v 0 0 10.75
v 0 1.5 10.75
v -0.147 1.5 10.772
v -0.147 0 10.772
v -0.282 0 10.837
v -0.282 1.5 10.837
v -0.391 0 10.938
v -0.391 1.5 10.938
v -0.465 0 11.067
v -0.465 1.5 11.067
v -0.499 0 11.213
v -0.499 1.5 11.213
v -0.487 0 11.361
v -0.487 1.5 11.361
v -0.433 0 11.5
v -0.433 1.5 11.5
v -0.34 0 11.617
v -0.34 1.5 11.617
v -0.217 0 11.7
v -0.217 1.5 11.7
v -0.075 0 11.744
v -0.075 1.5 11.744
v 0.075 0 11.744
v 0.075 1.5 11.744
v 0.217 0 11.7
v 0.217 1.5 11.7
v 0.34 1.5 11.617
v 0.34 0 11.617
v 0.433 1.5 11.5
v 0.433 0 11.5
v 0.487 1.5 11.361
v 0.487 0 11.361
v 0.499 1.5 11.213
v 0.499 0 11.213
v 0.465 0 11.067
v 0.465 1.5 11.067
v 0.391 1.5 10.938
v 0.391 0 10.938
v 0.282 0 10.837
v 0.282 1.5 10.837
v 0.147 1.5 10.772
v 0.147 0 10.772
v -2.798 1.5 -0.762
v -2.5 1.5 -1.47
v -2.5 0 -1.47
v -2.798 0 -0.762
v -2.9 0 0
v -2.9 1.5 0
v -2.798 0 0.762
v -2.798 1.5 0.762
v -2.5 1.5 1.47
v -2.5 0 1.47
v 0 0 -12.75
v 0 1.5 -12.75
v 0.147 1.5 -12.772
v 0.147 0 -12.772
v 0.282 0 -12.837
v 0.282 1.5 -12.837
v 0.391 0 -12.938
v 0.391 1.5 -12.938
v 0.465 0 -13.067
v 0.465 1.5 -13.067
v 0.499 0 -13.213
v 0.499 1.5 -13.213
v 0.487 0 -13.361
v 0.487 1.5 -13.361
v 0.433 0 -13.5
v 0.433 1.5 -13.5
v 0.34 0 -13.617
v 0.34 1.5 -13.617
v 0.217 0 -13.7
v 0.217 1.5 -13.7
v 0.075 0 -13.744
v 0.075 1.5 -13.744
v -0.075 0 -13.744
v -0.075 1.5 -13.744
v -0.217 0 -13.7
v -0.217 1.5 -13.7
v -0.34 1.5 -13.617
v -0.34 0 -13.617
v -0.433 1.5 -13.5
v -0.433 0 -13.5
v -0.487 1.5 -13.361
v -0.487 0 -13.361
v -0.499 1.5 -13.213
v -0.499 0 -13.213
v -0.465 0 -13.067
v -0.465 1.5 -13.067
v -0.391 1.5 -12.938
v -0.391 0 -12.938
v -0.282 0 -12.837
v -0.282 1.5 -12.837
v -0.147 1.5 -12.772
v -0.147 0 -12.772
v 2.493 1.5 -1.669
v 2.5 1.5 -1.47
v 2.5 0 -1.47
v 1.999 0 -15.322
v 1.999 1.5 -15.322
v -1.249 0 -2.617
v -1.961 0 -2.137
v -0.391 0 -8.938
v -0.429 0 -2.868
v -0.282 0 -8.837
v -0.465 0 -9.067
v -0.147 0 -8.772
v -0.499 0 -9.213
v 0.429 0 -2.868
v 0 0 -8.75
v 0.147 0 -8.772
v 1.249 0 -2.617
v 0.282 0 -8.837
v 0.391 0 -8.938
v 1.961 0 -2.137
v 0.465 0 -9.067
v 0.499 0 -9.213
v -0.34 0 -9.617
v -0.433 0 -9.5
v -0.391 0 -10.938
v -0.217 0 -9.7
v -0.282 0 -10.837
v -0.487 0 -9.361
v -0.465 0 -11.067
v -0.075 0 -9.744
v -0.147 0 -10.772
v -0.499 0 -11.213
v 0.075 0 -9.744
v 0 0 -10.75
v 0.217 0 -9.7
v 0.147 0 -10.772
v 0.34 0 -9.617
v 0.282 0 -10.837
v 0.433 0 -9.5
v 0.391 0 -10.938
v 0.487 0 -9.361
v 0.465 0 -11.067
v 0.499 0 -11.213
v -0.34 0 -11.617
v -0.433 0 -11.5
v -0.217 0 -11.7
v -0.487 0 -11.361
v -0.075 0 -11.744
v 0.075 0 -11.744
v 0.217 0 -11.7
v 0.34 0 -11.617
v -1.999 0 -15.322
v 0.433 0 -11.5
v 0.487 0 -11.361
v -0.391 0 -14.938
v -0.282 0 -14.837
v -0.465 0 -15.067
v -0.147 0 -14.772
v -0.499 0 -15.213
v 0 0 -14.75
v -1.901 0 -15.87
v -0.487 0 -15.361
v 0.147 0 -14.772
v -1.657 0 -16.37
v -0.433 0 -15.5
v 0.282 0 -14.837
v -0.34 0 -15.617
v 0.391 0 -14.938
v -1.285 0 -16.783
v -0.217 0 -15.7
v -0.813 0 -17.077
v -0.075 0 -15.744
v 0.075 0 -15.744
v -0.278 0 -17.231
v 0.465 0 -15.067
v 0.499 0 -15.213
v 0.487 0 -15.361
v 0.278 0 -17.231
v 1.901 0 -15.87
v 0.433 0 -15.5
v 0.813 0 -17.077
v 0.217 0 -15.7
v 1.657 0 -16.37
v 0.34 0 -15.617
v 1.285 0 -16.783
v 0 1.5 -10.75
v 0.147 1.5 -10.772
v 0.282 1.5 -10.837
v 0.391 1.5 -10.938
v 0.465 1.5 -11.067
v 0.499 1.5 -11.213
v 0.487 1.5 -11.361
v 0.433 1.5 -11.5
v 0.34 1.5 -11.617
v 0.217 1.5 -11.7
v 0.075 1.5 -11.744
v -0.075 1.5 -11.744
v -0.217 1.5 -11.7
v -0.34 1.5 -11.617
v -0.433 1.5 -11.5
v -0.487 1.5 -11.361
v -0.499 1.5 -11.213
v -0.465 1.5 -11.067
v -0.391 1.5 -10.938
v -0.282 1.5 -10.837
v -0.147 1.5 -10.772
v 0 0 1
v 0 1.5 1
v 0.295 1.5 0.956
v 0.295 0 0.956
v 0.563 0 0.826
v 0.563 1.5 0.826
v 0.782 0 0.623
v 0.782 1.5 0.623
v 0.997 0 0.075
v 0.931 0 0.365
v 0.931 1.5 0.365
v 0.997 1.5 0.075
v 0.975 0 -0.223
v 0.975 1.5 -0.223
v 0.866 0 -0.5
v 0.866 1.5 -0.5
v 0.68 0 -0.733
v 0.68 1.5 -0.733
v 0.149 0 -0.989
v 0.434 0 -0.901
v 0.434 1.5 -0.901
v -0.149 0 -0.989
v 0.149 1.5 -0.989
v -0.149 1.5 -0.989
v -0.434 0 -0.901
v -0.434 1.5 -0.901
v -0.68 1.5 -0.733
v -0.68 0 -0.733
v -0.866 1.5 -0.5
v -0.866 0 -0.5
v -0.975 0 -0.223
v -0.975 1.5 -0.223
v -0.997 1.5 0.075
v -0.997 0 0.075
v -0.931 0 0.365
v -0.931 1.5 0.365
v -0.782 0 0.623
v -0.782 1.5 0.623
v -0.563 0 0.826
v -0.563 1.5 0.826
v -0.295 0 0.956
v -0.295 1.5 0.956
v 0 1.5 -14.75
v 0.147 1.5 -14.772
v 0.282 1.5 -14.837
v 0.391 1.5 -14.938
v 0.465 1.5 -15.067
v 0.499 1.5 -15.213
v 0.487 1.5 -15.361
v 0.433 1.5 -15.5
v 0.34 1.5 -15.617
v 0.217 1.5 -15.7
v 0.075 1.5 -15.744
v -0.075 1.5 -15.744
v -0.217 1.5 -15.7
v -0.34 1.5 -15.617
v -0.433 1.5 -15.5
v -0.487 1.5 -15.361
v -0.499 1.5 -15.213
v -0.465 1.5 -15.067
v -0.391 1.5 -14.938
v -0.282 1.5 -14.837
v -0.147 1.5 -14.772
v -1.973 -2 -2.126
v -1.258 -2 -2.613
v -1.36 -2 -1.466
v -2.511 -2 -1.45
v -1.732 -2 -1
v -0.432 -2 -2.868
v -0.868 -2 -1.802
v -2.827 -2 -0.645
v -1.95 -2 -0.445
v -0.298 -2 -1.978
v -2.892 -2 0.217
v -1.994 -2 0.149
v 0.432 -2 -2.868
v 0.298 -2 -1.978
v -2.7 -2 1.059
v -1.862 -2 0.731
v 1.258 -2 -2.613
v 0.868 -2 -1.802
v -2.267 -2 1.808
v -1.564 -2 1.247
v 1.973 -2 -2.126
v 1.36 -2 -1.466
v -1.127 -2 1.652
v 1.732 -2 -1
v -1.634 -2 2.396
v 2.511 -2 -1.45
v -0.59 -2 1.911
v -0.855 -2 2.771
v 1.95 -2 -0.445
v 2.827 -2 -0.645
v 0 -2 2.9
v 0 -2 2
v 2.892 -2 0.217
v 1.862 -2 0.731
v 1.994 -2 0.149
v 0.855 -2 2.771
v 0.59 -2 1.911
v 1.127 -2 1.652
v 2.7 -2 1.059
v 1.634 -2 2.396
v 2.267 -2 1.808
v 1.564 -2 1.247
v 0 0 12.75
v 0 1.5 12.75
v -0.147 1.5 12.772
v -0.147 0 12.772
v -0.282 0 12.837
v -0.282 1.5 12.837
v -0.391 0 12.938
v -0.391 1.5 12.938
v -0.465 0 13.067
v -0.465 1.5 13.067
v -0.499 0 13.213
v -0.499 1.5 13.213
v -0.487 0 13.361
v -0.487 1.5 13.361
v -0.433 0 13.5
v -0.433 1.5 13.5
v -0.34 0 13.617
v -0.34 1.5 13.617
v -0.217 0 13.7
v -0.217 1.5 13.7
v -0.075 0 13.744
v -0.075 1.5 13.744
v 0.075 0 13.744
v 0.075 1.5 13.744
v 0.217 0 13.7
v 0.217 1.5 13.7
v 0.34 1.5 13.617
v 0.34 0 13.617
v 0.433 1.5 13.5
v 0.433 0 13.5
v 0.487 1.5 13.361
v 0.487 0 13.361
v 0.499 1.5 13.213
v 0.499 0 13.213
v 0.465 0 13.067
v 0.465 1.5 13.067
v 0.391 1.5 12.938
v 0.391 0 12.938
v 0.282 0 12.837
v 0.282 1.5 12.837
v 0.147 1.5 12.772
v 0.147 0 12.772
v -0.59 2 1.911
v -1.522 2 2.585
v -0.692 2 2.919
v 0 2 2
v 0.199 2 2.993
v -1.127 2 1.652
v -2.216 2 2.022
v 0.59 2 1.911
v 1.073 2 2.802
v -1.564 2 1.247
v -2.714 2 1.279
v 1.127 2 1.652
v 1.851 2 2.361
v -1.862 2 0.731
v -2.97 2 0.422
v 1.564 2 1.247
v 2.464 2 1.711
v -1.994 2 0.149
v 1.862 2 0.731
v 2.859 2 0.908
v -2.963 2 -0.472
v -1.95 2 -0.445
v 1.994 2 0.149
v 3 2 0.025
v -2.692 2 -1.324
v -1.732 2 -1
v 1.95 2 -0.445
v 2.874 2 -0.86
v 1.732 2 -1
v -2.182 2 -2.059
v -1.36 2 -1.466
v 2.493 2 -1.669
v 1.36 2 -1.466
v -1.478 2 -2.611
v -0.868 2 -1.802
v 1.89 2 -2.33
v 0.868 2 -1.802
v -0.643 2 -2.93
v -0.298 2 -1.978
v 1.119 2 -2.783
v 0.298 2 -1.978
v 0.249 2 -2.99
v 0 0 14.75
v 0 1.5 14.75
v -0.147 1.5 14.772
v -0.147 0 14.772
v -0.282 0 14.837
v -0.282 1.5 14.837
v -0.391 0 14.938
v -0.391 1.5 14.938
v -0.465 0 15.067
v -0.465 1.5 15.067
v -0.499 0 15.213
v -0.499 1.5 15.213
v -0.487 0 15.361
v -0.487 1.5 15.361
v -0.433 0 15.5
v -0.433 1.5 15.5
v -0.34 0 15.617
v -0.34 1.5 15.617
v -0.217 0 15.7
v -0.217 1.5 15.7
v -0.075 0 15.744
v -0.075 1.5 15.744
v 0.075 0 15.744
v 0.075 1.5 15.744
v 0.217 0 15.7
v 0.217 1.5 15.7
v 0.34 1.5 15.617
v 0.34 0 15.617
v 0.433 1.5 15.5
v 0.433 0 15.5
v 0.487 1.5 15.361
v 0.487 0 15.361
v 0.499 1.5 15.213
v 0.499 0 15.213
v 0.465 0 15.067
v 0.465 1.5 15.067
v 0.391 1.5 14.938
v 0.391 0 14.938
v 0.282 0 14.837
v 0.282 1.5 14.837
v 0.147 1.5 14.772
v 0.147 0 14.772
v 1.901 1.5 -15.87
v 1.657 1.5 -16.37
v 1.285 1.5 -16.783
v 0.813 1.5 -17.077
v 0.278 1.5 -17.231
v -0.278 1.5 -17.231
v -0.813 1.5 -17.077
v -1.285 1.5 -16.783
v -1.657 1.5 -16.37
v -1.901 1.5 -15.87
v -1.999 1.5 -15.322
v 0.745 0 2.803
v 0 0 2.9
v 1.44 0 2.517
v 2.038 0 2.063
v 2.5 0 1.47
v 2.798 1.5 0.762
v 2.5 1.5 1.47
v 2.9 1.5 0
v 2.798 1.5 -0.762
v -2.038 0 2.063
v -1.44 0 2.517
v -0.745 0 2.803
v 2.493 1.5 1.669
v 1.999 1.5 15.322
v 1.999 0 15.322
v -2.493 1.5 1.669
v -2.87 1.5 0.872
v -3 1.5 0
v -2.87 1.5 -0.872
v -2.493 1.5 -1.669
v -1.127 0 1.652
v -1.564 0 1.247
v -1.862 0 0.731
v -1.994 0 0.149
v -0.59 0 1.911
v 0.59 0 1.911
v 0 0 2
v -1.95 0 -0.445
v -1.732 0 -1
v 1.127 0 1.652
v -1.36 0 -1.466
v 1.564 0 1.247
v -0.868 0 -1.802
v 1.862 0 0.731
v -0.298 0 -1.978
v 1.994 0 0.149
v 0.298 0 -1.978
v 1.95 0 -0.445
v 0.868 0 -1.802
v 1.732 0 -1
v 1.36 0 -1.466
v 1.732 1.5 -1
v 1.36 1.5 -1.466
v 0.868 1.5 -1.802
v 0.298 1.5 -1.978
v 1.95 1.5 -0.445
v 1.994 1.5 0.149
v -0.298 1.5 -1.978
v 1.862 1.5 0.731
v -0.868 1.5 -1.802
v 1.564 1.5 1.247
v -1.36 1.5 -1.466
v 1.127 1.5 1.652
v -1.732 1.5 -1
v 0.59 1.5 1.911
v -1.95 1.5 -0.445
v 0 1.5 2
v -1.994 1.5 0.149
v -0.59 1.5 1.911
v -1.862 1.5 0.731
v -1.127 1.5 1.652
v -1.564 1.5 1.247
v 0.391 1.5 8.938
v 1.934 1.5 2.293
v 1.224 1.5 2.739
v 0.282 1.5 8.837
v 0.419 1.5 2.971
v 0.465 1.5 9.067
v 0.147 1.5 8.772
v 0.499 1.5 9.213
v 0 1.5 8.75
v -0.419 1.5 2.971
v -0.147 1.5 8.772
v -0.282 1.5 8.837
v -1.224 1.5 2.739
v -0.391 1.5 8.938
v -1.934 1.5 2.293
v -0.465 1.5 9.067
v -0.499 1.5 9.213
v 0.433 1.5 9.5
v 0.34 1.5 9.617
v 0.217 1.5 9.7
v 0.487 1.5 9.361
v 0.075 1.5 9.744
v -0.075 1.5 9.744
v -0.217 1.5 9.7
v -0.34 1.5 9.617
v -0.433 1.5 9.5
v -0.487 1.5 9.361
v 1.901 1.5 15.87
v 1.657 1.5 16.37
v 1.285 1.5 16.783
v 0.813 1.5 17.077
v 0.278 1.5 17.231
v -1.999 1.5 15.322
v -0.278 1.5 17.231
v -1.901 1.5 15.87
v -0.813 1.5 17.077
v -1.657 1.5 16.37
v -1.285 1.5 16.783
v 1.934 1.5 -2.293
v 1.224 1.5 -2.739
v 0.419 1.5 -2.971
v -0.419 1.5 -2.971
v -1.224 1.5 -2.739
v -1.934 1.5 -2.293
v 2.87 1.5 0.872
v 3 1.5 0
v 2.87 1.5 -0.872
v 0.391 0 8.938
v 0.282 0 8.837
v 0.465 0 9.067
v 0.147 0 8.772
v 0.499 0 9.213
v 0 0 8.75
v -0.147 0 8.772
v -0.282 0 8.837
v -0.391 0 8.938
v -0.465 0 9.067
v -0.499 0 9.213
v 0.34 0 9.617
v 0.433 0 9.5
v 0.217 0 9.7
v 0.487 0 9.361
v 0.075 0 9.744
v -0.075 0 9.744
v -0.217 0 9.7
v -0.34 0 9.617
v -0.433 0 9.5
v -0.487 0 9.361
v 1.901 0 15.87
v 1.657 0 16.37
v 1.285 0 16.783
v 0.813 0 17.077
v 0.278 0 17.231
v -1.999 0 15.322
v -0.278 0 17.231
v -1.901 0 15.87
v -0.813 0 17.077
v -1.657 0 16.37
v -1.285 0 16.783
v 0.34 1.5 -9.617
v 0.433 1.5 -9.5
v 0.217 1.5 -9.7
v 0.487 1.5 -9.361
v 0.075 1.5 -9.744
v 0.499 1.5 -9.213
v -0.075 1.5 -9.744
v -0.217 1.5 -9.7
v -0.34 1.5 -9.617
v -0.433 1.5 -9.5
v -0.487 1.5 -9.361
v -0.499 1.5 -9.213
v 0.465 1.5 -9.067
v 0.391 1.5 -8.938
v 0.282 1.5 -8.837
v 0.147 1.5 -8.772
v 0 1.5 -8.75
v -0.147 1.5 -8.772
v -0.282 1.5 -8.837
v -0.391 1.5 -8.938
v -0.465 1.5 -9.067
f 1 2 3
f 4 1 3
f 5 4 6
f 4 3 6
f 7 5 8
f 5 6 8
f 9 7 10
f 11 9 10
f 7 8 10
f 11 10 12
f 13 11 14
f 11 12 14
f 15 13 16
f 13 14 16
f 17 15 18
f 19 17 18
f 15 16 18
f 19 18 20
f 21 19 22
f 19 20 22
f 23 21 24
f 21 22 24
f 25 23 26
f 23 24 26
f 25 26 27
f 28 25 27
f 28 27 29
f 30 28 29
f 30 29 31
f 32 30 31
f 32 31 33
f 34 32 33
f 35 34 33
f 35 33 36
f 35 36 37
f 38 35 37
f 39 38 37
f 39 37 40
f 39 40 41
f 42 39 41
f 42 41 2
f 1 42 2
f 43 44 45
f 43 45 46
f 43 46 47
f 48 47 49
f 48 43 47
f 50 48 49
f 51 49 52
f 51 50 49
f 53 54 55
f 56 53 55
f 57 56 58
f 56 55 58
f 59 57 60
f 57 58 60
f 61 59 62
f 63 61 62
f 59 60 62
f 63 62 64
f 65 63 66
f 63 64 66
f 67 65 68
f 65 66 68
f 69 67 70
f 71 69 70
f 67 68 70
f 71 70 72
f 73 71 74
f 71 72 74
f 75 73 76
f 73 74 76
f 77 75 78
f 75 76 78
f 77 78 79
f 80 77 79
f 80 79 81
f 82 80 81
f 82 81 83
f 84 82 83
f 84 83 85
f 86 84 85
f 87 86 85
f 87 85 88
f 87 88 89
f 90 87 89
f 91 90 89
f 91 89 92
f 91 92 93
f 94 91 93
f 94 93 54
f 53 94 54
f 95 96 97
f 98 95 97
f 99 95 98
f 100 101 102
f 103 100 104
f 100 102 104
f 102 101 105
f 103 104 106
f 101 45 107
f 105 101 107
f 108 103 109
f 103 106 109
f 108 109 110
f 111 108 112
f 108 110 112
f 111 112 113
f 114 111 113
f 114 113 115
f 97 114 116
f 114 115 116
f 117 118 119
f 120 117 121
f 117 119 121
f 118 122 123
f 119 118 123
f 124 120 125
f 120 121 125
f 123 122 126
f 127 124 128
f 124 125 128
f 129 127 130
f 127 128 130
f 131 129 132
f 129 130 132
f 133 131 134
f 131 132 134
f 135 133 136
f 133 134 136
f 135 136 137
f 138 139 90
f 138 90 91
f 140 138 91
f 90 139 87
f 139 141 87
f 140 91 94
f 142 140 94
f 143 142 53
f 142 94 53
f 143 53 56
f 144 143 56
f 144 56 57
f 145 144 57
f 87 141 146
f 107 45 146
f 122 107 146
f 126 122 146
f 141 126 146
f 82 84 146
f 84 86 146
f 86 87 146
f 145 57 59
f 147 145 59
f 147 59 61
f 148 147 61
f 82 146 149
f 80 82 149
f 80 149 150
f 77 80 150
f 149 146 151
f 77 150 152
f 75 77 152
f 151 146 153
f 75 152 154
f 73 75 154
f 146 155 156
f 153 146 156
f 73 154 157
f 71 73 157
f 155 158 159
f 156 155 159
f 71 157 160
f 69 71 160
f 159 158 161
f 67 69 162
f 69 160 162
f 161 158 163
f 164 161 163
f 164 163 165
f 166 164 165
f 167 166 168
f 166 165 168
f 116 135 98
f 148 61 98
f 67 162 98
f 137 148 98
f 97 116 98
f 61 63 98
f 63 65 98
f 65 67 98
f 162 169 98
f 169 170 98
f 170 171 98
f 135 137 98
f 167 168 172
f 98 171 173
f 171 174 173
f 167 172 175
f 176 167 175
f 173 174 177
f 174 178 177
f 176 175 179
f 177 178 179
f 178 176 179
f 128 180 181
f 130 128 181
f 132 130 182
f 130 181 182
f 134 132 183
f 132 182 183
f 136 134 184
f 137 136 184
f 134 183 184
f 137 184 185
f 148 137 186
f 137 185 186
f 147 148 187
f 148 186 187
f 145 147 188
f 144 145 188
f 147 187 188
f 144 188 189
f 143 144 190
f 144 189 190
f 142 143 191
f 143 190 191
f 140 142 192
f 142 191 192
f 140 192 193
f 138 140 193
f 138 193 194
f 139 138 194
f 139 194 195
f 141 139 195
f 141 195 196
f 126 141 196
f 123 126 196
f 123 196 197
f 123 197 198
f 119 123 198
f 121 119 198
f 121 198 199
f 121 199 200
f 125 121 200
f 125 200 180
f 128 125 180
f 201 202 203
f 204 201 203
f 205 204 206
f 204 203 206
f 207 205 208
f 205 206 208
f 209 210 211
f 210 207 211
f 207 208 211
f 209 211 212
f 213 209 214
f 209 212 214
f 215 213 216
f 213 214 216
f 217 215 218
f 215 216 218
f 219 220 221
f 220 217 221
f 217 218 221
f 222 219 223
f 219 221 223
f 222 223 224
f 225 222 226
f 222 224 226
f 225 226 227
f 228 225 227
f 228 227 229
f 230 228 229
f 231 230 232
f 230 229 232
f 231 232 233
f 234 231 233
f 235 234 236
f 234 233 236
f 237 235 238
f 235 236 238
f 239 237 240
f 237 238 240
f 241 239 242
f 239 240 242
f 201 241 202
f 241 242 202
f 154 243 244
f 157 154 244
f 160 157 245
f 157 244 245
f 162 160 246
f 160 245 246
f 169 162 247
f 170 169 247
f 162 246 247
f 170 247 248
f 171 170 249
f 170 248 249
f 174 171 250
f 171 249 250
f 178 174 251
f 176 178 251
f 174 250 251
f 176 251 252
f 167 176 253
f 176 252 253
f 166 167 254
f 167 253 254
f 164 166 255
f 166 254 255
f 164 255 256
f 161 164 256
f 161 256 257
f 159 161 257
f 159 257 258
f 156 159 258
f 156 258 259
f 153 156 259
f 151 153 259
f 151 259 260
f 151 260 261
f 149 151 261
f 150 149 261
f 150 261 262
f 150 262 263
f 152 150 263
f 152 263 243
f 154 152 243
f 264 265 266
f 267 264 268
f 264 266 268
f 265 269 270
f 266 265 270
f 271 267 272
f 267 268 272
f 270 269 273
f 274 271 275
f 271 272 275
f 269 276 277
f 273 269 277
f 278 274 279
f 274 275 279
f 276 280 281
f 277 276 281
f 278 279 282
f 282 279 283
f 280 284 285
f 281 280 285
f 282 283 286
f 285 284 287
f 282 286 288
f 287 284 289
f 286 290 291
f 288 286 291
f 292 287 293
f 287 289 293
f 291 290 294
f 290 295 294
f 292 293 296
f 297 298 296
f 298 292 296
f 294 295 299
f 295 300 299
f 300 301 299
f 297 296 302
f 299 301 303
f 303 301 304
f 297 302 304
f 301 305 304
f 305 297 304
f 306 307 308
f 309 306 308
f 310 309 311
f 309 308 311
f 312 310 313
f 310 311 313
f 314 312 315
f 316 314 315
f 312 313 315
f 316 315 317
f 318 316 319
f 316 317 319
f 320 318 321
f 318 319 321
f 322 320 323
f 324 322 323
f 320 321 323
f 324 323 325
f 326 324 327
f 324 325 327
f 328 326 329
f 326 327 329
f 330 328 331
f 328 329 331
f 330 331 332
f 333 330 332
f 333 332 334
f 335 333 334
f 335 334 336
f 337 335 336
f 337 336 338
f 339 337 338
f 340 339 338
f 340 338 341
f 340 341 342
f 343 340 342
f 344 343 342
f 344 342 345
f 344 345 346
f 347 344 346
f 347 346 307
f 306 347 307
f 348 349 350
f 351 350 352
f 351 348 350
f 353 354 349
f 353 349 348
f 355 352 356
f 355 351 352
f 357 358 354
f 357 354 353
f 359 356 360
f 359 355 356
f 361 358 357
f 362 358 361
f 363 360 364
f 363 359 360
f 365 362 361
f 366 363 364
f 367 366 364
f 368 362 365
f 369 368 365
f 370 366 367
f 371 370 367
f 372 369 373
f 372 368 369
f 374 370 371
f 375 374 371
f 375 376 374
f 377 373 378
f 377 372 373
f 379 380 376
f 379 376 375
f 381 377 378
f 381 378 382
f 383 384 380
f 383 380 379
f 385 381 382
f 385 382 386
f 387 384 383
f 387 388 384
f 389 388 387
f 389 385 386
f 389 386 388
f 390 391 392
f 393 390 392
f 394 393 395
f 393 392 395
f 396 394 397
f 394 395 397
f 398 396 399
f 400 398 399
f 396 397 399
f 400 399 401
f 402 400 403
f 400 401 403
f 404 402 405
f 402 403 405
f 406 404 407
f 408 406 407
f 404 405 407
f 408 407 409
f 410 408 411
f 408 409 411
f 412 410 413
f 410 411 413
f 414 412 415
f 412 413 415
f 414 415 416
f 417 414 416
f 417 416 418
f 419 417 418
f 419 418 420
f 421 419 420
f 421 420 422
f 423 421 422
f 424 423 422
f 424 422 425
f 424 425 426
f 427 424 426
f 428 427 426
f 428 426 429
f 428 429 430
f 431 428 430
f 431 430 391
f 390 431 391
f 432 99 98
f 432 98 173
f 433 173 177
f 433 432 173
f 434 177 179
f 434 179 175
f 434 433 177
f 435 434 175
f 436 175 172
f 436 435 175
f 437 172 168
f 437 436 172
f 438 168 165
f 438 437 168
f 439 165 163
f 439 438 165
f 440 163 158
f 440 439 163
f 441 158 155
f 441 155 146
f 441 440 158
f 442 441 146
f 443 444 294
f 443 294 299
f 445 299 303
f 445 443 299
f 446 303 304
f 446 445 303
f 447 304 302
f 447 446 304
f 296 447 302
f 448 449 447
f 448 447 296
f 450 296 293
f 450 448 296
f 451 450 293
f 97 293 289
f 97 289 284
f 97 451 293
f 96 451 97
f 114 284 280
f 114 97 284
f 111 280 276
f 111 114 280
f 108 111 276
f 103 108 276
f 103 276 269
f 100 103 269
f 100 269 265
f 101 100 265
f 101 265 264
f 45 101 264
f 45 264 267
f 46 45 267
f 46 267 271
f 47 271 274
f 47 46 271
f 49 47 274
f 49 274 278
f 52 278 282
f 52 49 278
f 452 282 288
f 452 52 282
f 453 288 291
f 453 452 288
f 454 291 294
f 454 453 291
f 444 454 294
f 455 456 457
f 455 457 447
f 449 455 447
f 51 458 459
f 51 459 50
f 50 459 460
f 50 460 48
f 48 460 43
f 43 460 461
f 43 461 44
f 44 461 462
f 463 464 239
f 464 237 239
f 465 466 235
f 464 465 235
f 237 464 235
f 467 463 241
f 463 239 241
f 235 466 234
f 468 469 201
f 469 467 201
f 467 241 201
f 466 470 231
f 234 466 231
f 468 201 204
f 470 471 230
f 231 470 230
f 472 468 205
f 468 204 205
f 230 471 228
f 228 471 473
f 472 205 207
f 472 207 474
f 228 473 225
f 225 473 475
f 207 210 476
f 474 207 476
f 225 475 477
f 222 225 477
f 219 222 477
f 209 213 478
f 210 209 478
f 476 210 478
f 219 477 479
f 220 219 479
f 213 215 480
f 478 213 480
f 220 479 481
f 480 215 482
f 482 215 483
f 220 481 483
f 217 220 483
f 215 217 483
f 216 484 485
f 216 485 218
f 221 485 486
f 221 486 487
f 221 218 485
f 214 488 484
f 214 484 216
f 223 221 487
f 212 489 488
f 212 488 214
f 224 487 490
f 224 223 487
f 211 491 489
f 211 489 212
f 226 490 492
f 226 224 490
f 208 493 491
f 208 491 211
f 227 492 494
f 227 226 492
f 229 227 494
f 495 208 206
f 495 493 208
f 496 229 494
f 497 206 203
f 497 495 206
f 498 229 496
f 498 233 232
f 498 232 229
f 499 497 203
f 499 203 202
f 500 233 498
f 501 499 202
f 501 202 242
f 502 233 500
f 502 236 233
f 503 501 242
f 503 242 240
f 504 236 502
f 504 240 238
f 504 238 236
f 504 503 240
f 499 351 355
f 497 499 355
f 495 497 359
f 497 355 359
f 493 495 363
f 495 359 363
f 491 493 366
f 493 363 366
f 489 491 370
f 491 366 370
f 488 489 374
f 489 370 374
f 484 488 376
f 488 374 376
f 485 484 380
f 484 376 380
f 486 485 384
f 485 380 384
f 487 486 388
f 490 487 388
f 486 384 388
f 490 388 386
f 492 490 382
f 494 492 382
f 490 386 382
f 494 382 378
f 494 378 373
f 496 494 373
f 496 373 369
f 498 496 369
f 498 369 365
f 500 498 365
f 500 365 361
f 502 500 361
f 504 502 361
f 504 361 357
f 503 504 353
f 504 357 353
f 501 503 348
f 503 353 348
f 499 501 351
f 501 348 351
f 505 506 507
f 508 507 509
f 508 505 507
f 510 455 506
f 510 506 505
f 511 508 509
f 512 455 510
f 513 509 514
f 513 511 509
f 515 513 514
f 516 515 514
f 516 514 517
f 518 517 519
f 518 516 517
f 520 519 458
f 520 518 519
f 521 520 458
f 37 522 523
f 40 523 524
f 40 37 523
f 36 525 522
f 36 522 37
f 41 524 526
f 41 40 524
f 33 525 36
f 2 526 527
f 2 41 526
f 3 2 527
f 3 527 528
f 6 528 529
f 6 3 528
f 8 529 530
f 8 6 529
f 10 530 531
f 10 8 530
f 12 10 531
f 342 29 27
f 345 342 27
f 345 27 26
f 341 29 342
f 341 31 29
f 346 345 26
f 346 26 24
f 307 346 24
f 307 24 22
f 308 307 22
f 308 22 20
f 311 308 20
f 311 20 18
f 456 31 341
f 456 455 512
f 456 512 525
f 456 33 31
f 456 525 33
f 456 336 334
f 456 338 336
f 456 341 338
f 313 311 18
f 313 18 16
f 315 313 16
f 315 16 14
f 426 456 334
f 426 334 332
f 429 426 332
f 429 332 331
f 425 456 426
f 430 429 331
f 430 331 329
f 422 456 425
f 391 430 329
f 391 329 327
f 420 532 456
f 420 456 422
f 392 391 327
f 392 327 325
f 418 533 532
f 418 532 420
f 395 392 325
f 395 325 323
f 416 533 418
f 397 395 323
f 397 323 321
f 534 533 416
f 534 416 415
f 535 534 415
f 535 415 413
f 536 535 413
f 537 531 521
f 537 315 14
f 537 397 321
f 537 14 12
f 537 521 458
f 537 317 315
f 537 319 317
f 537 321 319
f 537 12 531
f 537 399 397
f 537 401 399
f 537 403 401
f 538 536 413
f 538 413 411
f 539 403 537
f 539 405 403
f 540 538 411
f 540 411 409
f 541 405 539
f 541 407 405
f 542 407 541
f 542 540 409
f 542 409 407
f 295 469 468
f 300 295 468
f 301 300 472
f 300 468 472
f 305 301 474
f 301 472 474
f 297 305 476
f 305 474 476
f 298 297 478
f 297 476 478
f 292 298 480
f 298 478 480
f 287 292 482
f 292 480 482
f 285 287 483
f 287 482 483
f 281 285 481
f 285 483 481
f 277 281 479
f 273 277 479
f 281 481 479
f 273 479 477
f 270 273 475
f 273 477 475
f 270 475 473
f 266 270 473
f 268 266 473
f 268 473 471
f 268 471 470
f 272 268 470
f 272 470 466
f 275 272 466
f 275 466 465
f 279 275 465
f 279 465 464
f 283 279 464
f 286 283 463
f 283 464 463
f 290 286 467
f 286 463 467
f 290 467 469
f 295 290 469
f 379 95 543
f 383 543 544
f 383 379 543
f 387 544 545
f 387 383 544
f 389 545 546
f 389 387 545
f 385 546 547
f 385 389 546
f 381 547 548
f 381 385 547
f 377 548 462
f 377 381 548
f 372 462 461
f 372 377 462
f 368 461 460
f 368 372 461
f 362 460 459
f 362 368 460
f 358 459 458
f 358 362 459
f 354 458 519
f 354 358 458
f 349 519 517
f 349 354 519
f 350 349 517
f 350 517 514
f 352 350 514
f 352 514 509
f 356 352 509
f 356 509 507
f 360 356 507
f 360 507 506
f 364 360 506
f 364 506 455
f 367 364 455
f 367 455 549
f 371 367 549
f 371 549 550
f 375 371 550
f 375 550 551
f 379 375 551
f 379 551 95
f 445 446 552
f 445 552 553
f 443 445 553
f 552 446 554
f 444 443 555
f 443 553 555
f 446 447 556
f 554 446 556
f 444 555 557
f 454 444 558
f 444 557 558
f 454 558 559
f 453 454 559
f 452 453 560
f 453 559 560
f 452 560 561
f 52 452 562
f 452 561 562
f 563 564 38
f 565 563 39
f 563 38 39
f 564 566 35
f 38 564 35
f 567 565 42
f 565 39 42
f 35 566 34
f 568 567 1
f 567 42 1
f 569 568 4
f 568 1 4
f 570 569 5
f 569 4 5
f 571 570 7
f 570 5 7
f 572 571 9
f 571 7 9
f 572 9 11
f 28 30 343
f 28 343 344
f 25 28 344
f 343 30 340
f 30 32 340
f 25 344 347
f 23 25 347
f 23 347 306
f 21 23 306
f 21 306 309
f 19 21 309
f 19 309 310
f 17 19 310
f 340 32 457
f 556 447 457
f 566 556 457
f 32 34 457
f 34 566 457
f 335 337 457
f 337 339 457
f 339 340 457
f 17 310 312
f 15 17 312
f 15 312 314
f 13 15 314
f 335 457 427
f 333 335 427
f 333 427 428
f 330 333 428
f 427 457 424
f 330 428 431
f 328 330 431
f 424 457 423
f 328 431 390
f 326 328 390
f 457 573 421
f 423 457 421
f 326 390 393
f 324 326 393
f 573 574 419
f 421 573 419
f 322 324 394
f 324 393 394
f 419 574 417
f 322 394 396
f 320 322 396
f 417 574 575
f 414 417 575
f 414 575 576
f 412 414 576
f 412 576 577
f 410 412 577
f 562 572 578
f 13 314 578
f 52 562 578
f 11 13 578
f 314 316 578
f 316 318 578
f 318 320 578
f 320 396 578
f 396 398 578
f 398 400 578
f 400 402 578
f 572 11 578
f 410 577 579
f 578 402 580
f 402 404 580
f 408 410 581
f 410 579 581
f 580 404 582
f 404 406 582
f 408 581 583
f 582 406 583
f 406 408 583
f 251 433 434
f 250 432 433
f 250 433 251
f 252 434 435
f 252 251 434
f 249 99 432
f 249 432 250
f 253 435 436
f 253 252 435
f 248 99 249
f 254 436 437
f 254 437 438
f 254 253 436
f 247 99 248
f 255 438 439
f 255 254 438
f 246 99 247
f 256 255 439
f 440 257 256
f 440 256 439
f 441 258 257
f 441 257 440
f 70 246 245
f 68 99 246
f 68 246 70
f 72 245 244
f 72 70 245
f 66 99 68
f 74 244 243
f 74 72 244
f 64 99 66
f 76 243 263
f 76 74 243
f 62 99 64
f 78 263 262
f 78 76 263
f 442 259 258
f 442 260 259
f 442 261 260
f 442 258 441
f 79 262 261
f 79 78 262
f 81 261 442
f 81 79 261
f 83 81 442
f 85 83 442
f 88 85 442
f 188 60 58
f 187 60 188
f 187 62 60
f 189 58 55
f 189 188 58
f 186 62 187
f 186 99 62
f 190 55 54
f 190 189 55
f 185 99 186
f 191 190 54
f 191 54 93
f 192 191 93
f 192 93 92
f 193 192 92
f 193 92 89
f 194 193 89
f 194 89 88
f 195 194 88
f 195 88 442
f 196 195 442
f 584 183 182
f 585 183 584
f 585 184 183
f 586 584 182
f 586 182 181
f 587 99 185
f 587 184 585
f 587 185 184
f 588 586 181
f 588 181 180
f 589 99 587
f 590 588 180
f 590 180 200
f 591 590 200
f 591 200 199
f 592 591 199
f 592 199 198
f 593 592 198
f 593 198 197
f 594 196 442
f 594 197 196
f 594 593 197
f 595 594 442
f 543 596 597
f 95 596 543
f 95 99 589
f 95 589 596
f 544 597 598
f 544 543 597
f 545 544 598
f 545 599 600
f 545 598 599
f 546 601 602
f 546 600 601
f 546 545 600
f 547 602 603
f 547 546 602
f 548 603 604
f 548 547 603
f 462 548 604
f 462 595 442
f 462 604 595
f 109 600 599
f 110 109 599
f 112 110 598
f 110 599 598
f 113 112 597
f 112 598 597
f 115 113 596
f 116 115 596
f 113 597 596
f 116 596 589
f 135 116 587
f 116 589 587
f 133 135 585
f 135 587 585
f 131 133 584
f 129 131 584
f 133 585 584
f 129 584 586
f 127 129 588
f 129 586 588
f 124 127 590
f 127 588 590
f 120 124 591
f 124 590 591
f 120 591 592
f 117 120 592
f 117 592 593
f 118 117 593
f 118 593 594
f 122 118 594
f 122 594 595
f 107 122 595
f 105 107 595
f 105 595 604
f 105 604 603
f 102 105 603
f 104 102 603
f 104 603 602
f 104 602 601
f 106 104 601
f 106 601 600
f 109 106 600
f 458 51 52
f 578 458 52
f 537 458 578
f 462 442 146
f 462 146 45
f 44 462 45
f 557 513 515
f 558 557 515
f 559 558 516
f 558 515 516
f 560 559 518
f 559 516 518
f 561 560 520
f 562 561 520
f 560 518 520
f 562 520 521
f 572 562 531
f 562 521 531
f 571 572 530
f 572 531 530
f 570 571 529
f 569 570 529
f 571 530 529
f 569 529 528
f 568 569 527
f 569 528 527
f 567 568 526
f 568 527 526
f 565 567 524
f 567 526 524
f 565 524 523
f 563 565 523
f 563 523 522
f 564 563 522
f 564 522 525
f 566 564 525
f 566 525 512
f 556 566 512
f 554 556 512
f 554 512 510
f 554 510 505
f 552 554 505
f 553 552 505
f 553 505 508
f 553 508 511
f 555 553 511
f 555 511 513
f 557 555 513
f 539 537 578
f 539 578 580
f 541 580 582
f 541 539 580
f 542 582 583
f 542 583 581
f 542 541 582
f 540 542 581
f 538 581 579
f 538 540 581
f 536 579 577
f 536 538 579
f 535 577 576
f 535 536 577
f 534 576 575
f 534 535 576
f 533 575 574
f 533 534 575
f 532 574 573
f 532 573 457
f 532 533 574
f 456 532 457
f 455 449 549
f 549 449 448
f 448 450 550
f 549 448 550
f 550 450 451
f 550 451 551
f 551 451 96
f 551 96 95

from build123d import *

# Parameters (mm, degrees)
ESQUISSE1_R                            = 2.9
ESQUISSE1_R_2                          = 2
BOSS_EXTRU_1_DEPTH                     = 2
BOSS_EXTRU_2_START                     = 1.5
ESQUISSE2_R                            = 1
BOSS_EXTRU_2_DEPTH                     = 1.5
ESQUISSE4_R                            = 0.5
ENL_V_MAT_EXTRU_1_DEPTH                = 18.838791999
R_P_TITION_LIN_AIRE1_COUNT             = 4
R_P_TITION_LIN_AIRE1_PITCH             = 2
R_P_TITION_CIRCULAIRE1_COUNT           = 2
R_P_TITION_CIRCULAIRE1_COPY_1_SKETCH_R = 0.5
R_P_TITION_CIRCULAIRE1_COPY_1_DEPTH    = 18.838791999
R_P_TITION_CIRCULAIRE1_COPY_2_SKETCH_R = 0.5
R_P_TITION_CIRCULAIRE1_COPY_2_DEPTH    = 18.838791999
R_P_TITION_CIRCULAIRE1_COPY_3_SKETCH_R = 0.5
R_P_TITION_CIRCULAIRE1_COPY_3_DEPTH    = 18.838791999
BOSS_EXTRU_3_START                     = 0.5
ESQUISSE3_R                            = 3
ESQUISSE3_R_2                          = 2
BOSS_EXTRU_3_DEPTH                     = 0.5


with BuildPart() as part:
    # Esquisse1 → Boss.-Extru.1 (new body)
    with BuildSketch(Plane(origin=(0, 0, 0), x_dir=(1, 0, 0), z_dir=(0, 1, 0))):
        with Locations(Location((0, 0, 0), (0, 0, 270))):
            Circle(ESQUISSE1_R)
        with Locations(Location((0, 0, 0), (0, 0, 270))):
            Circle(ESQUISSE1_R_2, mode=Mode.SUBTRACT)
    extrude(amount=-BOSS_EXTRU_1_DEPTH)

    # Esquisse2 → Boss.-Extru.2 (add)
    with BuildSketch(Plane(origin=(0, 0, 0), x_dir=(1, 0, 0), z_dir=(0, 1, 0)).offset(BOSS_EXTRU_2_START)):
        with BuildLine():
            Line((-1.998691666, 15.322329972), (-2.5, 1.469693846))
            ThreePointArc((-2.5, 1.469693846), (0, -2.9), (2.5, 1.469693846))
            Line((2.5, 1.469693846), (1.998691666, 15.322329972))
            ThreePointArc((1.998691666, 15.322329972), (0, 17.25), (-1.998691666, 15.322329972))
        make_face()
        with Locations(Location((0, 0, 0), (0, 0, 270))):
            Circle(ESQUISSE2_R, mode=Mode.SUBTRACT)
    boss_extru_2 = extrude(amount=-BOSS_EXTRU_2_DEPTH)

    # Esquisse4 → Enlèv. mat.-Extru.1 (cut, through all)
    with BuildSketch(Plane(origin=(0, 1.5, 0), x_dir=(1, 0, 0), z_dir=(0, 1, 0))):
        with Locations(Location((0, 15.25, 0), (0, 0, 270))):
            Circle(ESQUISSE4_R)
    enl_v_mat_extru_1 = extrude(amount=-ENL_V_MAT_EXTRU_1_DEPTH, mode=Mode.SUBTRACT)

    # Répétition linéaire1: Enlèv. mat.-Extru.1 ×4
    with Locations(*[(0, 0, i * R_P_TITION_LIN_AIRE1_PITCH) for i in range(1, R_P_TITION_LIN_AIRE1_COUNT)]):
        add(enl_v_mat_extru_1, mode=Mode.SUBTRACT)

    # Répétition circulaire1: Boss.-Extru.2, Enlèv. mat.-Extru.1 ×2 about axis
    r_p_tition_circulaire1_axis = Axis((0, 0, 0), (0, 1, 0))
    add([boss_extru_2.rotate(r_p_tition_circulaire1_axis, i * 360 / R_P_TITION_CIRCULAIRE1_COUNT) for i in range(1, R_P_TITION_CIRCULAIRE1_COUNT)])
    add([enl_v_mat_extru_1.rotate(r_p_tition_circulaire1_axis, i * 360 / R_P_TITION_CIRCULAIRE1_COUNT) for i in range(1, R_P_TITION_CIRCULAIRE1_COUNT)], mode=Mode.SUBTRACT)

    # Répétition circulaire1 copy 1 sketch → Répétition circulaire1 copy 1 (cut, through all)
    with BuildSketch(Plane(origin=(0, 1.5, -2), x_dir=(-1, 0, 0), z_dir=(0, 1, 0))):
        with Locations(Location((0, 15.25, 0), (0, 0, 270))):
            Circle(R_P_TITION_CIRCULAIRE1_COPY_1_SKETCH_R)
    extrude(amount=-R_P_TITION_CIRCULAIRE1_COPY_1_DEPTH, mode=Mode.SUBTRACT)

    # Répétition circulaire1 copy 2 sketch → Répétition circulaire1 copy 2 (cut, through all)
    with BuildSketch(Plane(origin=(0, 1.5, -4), x_dir=(-1, 0, 0), z_dir=(0, 1, 0))):
        with Locations(Location((0, 15.25, 0), (0, 0, 270))):
            Circle(R_P_TITION_CIRCULAIRE1_COPY_2_SKETCH_R)
    extrude(amount=-R_P_TITION_CIRCULAIRE1_COPY_2_DEPTH, mode=Mode.SUBTRACT)

    # Répétition circulaire1 copy 3 sketch → Répétition circulaire1 copy 3 (cut, through all)
    with BuildSketch(Plane(origin=(0, 1.5, -6), x_dir=(-1, 0, 0), z_dir=(0, 1, 0))):
        with Locations(Location((0, 15.25, 0), (0, 0, 270))):
            Circle(R_P_TITION_CIRCULAIRE1_COPY_3_SKETCH_R)
    extrude(amount=-R_P_TITION_CIRCULAIRE1_COPY_3_DEPTH, mode=Mode.SUBTRACT)

    # Esquisse3 → Boss.-Extru.3 (add)
    with BuildSketch(Plane(origin=(0, 1.5, 0), x_dir=(1, 0, 0), z_dir=(0, 1, 0)).offset(BOSS_EXTRU_3_START)):
        with Locations(Location((0, 0, 0), (0, 0, 33.805876752))):
            Circle(ESQUISSE3_R)
        with Locations(Location((0, 0, 0), (0, 0, 270))):
            Circle(ESQUISSE3_R_2, mode=Mode.SUBTRACT)
    extrude(amount=-BOSS_EXTRU_3_DEPTH)


solid = part.part
